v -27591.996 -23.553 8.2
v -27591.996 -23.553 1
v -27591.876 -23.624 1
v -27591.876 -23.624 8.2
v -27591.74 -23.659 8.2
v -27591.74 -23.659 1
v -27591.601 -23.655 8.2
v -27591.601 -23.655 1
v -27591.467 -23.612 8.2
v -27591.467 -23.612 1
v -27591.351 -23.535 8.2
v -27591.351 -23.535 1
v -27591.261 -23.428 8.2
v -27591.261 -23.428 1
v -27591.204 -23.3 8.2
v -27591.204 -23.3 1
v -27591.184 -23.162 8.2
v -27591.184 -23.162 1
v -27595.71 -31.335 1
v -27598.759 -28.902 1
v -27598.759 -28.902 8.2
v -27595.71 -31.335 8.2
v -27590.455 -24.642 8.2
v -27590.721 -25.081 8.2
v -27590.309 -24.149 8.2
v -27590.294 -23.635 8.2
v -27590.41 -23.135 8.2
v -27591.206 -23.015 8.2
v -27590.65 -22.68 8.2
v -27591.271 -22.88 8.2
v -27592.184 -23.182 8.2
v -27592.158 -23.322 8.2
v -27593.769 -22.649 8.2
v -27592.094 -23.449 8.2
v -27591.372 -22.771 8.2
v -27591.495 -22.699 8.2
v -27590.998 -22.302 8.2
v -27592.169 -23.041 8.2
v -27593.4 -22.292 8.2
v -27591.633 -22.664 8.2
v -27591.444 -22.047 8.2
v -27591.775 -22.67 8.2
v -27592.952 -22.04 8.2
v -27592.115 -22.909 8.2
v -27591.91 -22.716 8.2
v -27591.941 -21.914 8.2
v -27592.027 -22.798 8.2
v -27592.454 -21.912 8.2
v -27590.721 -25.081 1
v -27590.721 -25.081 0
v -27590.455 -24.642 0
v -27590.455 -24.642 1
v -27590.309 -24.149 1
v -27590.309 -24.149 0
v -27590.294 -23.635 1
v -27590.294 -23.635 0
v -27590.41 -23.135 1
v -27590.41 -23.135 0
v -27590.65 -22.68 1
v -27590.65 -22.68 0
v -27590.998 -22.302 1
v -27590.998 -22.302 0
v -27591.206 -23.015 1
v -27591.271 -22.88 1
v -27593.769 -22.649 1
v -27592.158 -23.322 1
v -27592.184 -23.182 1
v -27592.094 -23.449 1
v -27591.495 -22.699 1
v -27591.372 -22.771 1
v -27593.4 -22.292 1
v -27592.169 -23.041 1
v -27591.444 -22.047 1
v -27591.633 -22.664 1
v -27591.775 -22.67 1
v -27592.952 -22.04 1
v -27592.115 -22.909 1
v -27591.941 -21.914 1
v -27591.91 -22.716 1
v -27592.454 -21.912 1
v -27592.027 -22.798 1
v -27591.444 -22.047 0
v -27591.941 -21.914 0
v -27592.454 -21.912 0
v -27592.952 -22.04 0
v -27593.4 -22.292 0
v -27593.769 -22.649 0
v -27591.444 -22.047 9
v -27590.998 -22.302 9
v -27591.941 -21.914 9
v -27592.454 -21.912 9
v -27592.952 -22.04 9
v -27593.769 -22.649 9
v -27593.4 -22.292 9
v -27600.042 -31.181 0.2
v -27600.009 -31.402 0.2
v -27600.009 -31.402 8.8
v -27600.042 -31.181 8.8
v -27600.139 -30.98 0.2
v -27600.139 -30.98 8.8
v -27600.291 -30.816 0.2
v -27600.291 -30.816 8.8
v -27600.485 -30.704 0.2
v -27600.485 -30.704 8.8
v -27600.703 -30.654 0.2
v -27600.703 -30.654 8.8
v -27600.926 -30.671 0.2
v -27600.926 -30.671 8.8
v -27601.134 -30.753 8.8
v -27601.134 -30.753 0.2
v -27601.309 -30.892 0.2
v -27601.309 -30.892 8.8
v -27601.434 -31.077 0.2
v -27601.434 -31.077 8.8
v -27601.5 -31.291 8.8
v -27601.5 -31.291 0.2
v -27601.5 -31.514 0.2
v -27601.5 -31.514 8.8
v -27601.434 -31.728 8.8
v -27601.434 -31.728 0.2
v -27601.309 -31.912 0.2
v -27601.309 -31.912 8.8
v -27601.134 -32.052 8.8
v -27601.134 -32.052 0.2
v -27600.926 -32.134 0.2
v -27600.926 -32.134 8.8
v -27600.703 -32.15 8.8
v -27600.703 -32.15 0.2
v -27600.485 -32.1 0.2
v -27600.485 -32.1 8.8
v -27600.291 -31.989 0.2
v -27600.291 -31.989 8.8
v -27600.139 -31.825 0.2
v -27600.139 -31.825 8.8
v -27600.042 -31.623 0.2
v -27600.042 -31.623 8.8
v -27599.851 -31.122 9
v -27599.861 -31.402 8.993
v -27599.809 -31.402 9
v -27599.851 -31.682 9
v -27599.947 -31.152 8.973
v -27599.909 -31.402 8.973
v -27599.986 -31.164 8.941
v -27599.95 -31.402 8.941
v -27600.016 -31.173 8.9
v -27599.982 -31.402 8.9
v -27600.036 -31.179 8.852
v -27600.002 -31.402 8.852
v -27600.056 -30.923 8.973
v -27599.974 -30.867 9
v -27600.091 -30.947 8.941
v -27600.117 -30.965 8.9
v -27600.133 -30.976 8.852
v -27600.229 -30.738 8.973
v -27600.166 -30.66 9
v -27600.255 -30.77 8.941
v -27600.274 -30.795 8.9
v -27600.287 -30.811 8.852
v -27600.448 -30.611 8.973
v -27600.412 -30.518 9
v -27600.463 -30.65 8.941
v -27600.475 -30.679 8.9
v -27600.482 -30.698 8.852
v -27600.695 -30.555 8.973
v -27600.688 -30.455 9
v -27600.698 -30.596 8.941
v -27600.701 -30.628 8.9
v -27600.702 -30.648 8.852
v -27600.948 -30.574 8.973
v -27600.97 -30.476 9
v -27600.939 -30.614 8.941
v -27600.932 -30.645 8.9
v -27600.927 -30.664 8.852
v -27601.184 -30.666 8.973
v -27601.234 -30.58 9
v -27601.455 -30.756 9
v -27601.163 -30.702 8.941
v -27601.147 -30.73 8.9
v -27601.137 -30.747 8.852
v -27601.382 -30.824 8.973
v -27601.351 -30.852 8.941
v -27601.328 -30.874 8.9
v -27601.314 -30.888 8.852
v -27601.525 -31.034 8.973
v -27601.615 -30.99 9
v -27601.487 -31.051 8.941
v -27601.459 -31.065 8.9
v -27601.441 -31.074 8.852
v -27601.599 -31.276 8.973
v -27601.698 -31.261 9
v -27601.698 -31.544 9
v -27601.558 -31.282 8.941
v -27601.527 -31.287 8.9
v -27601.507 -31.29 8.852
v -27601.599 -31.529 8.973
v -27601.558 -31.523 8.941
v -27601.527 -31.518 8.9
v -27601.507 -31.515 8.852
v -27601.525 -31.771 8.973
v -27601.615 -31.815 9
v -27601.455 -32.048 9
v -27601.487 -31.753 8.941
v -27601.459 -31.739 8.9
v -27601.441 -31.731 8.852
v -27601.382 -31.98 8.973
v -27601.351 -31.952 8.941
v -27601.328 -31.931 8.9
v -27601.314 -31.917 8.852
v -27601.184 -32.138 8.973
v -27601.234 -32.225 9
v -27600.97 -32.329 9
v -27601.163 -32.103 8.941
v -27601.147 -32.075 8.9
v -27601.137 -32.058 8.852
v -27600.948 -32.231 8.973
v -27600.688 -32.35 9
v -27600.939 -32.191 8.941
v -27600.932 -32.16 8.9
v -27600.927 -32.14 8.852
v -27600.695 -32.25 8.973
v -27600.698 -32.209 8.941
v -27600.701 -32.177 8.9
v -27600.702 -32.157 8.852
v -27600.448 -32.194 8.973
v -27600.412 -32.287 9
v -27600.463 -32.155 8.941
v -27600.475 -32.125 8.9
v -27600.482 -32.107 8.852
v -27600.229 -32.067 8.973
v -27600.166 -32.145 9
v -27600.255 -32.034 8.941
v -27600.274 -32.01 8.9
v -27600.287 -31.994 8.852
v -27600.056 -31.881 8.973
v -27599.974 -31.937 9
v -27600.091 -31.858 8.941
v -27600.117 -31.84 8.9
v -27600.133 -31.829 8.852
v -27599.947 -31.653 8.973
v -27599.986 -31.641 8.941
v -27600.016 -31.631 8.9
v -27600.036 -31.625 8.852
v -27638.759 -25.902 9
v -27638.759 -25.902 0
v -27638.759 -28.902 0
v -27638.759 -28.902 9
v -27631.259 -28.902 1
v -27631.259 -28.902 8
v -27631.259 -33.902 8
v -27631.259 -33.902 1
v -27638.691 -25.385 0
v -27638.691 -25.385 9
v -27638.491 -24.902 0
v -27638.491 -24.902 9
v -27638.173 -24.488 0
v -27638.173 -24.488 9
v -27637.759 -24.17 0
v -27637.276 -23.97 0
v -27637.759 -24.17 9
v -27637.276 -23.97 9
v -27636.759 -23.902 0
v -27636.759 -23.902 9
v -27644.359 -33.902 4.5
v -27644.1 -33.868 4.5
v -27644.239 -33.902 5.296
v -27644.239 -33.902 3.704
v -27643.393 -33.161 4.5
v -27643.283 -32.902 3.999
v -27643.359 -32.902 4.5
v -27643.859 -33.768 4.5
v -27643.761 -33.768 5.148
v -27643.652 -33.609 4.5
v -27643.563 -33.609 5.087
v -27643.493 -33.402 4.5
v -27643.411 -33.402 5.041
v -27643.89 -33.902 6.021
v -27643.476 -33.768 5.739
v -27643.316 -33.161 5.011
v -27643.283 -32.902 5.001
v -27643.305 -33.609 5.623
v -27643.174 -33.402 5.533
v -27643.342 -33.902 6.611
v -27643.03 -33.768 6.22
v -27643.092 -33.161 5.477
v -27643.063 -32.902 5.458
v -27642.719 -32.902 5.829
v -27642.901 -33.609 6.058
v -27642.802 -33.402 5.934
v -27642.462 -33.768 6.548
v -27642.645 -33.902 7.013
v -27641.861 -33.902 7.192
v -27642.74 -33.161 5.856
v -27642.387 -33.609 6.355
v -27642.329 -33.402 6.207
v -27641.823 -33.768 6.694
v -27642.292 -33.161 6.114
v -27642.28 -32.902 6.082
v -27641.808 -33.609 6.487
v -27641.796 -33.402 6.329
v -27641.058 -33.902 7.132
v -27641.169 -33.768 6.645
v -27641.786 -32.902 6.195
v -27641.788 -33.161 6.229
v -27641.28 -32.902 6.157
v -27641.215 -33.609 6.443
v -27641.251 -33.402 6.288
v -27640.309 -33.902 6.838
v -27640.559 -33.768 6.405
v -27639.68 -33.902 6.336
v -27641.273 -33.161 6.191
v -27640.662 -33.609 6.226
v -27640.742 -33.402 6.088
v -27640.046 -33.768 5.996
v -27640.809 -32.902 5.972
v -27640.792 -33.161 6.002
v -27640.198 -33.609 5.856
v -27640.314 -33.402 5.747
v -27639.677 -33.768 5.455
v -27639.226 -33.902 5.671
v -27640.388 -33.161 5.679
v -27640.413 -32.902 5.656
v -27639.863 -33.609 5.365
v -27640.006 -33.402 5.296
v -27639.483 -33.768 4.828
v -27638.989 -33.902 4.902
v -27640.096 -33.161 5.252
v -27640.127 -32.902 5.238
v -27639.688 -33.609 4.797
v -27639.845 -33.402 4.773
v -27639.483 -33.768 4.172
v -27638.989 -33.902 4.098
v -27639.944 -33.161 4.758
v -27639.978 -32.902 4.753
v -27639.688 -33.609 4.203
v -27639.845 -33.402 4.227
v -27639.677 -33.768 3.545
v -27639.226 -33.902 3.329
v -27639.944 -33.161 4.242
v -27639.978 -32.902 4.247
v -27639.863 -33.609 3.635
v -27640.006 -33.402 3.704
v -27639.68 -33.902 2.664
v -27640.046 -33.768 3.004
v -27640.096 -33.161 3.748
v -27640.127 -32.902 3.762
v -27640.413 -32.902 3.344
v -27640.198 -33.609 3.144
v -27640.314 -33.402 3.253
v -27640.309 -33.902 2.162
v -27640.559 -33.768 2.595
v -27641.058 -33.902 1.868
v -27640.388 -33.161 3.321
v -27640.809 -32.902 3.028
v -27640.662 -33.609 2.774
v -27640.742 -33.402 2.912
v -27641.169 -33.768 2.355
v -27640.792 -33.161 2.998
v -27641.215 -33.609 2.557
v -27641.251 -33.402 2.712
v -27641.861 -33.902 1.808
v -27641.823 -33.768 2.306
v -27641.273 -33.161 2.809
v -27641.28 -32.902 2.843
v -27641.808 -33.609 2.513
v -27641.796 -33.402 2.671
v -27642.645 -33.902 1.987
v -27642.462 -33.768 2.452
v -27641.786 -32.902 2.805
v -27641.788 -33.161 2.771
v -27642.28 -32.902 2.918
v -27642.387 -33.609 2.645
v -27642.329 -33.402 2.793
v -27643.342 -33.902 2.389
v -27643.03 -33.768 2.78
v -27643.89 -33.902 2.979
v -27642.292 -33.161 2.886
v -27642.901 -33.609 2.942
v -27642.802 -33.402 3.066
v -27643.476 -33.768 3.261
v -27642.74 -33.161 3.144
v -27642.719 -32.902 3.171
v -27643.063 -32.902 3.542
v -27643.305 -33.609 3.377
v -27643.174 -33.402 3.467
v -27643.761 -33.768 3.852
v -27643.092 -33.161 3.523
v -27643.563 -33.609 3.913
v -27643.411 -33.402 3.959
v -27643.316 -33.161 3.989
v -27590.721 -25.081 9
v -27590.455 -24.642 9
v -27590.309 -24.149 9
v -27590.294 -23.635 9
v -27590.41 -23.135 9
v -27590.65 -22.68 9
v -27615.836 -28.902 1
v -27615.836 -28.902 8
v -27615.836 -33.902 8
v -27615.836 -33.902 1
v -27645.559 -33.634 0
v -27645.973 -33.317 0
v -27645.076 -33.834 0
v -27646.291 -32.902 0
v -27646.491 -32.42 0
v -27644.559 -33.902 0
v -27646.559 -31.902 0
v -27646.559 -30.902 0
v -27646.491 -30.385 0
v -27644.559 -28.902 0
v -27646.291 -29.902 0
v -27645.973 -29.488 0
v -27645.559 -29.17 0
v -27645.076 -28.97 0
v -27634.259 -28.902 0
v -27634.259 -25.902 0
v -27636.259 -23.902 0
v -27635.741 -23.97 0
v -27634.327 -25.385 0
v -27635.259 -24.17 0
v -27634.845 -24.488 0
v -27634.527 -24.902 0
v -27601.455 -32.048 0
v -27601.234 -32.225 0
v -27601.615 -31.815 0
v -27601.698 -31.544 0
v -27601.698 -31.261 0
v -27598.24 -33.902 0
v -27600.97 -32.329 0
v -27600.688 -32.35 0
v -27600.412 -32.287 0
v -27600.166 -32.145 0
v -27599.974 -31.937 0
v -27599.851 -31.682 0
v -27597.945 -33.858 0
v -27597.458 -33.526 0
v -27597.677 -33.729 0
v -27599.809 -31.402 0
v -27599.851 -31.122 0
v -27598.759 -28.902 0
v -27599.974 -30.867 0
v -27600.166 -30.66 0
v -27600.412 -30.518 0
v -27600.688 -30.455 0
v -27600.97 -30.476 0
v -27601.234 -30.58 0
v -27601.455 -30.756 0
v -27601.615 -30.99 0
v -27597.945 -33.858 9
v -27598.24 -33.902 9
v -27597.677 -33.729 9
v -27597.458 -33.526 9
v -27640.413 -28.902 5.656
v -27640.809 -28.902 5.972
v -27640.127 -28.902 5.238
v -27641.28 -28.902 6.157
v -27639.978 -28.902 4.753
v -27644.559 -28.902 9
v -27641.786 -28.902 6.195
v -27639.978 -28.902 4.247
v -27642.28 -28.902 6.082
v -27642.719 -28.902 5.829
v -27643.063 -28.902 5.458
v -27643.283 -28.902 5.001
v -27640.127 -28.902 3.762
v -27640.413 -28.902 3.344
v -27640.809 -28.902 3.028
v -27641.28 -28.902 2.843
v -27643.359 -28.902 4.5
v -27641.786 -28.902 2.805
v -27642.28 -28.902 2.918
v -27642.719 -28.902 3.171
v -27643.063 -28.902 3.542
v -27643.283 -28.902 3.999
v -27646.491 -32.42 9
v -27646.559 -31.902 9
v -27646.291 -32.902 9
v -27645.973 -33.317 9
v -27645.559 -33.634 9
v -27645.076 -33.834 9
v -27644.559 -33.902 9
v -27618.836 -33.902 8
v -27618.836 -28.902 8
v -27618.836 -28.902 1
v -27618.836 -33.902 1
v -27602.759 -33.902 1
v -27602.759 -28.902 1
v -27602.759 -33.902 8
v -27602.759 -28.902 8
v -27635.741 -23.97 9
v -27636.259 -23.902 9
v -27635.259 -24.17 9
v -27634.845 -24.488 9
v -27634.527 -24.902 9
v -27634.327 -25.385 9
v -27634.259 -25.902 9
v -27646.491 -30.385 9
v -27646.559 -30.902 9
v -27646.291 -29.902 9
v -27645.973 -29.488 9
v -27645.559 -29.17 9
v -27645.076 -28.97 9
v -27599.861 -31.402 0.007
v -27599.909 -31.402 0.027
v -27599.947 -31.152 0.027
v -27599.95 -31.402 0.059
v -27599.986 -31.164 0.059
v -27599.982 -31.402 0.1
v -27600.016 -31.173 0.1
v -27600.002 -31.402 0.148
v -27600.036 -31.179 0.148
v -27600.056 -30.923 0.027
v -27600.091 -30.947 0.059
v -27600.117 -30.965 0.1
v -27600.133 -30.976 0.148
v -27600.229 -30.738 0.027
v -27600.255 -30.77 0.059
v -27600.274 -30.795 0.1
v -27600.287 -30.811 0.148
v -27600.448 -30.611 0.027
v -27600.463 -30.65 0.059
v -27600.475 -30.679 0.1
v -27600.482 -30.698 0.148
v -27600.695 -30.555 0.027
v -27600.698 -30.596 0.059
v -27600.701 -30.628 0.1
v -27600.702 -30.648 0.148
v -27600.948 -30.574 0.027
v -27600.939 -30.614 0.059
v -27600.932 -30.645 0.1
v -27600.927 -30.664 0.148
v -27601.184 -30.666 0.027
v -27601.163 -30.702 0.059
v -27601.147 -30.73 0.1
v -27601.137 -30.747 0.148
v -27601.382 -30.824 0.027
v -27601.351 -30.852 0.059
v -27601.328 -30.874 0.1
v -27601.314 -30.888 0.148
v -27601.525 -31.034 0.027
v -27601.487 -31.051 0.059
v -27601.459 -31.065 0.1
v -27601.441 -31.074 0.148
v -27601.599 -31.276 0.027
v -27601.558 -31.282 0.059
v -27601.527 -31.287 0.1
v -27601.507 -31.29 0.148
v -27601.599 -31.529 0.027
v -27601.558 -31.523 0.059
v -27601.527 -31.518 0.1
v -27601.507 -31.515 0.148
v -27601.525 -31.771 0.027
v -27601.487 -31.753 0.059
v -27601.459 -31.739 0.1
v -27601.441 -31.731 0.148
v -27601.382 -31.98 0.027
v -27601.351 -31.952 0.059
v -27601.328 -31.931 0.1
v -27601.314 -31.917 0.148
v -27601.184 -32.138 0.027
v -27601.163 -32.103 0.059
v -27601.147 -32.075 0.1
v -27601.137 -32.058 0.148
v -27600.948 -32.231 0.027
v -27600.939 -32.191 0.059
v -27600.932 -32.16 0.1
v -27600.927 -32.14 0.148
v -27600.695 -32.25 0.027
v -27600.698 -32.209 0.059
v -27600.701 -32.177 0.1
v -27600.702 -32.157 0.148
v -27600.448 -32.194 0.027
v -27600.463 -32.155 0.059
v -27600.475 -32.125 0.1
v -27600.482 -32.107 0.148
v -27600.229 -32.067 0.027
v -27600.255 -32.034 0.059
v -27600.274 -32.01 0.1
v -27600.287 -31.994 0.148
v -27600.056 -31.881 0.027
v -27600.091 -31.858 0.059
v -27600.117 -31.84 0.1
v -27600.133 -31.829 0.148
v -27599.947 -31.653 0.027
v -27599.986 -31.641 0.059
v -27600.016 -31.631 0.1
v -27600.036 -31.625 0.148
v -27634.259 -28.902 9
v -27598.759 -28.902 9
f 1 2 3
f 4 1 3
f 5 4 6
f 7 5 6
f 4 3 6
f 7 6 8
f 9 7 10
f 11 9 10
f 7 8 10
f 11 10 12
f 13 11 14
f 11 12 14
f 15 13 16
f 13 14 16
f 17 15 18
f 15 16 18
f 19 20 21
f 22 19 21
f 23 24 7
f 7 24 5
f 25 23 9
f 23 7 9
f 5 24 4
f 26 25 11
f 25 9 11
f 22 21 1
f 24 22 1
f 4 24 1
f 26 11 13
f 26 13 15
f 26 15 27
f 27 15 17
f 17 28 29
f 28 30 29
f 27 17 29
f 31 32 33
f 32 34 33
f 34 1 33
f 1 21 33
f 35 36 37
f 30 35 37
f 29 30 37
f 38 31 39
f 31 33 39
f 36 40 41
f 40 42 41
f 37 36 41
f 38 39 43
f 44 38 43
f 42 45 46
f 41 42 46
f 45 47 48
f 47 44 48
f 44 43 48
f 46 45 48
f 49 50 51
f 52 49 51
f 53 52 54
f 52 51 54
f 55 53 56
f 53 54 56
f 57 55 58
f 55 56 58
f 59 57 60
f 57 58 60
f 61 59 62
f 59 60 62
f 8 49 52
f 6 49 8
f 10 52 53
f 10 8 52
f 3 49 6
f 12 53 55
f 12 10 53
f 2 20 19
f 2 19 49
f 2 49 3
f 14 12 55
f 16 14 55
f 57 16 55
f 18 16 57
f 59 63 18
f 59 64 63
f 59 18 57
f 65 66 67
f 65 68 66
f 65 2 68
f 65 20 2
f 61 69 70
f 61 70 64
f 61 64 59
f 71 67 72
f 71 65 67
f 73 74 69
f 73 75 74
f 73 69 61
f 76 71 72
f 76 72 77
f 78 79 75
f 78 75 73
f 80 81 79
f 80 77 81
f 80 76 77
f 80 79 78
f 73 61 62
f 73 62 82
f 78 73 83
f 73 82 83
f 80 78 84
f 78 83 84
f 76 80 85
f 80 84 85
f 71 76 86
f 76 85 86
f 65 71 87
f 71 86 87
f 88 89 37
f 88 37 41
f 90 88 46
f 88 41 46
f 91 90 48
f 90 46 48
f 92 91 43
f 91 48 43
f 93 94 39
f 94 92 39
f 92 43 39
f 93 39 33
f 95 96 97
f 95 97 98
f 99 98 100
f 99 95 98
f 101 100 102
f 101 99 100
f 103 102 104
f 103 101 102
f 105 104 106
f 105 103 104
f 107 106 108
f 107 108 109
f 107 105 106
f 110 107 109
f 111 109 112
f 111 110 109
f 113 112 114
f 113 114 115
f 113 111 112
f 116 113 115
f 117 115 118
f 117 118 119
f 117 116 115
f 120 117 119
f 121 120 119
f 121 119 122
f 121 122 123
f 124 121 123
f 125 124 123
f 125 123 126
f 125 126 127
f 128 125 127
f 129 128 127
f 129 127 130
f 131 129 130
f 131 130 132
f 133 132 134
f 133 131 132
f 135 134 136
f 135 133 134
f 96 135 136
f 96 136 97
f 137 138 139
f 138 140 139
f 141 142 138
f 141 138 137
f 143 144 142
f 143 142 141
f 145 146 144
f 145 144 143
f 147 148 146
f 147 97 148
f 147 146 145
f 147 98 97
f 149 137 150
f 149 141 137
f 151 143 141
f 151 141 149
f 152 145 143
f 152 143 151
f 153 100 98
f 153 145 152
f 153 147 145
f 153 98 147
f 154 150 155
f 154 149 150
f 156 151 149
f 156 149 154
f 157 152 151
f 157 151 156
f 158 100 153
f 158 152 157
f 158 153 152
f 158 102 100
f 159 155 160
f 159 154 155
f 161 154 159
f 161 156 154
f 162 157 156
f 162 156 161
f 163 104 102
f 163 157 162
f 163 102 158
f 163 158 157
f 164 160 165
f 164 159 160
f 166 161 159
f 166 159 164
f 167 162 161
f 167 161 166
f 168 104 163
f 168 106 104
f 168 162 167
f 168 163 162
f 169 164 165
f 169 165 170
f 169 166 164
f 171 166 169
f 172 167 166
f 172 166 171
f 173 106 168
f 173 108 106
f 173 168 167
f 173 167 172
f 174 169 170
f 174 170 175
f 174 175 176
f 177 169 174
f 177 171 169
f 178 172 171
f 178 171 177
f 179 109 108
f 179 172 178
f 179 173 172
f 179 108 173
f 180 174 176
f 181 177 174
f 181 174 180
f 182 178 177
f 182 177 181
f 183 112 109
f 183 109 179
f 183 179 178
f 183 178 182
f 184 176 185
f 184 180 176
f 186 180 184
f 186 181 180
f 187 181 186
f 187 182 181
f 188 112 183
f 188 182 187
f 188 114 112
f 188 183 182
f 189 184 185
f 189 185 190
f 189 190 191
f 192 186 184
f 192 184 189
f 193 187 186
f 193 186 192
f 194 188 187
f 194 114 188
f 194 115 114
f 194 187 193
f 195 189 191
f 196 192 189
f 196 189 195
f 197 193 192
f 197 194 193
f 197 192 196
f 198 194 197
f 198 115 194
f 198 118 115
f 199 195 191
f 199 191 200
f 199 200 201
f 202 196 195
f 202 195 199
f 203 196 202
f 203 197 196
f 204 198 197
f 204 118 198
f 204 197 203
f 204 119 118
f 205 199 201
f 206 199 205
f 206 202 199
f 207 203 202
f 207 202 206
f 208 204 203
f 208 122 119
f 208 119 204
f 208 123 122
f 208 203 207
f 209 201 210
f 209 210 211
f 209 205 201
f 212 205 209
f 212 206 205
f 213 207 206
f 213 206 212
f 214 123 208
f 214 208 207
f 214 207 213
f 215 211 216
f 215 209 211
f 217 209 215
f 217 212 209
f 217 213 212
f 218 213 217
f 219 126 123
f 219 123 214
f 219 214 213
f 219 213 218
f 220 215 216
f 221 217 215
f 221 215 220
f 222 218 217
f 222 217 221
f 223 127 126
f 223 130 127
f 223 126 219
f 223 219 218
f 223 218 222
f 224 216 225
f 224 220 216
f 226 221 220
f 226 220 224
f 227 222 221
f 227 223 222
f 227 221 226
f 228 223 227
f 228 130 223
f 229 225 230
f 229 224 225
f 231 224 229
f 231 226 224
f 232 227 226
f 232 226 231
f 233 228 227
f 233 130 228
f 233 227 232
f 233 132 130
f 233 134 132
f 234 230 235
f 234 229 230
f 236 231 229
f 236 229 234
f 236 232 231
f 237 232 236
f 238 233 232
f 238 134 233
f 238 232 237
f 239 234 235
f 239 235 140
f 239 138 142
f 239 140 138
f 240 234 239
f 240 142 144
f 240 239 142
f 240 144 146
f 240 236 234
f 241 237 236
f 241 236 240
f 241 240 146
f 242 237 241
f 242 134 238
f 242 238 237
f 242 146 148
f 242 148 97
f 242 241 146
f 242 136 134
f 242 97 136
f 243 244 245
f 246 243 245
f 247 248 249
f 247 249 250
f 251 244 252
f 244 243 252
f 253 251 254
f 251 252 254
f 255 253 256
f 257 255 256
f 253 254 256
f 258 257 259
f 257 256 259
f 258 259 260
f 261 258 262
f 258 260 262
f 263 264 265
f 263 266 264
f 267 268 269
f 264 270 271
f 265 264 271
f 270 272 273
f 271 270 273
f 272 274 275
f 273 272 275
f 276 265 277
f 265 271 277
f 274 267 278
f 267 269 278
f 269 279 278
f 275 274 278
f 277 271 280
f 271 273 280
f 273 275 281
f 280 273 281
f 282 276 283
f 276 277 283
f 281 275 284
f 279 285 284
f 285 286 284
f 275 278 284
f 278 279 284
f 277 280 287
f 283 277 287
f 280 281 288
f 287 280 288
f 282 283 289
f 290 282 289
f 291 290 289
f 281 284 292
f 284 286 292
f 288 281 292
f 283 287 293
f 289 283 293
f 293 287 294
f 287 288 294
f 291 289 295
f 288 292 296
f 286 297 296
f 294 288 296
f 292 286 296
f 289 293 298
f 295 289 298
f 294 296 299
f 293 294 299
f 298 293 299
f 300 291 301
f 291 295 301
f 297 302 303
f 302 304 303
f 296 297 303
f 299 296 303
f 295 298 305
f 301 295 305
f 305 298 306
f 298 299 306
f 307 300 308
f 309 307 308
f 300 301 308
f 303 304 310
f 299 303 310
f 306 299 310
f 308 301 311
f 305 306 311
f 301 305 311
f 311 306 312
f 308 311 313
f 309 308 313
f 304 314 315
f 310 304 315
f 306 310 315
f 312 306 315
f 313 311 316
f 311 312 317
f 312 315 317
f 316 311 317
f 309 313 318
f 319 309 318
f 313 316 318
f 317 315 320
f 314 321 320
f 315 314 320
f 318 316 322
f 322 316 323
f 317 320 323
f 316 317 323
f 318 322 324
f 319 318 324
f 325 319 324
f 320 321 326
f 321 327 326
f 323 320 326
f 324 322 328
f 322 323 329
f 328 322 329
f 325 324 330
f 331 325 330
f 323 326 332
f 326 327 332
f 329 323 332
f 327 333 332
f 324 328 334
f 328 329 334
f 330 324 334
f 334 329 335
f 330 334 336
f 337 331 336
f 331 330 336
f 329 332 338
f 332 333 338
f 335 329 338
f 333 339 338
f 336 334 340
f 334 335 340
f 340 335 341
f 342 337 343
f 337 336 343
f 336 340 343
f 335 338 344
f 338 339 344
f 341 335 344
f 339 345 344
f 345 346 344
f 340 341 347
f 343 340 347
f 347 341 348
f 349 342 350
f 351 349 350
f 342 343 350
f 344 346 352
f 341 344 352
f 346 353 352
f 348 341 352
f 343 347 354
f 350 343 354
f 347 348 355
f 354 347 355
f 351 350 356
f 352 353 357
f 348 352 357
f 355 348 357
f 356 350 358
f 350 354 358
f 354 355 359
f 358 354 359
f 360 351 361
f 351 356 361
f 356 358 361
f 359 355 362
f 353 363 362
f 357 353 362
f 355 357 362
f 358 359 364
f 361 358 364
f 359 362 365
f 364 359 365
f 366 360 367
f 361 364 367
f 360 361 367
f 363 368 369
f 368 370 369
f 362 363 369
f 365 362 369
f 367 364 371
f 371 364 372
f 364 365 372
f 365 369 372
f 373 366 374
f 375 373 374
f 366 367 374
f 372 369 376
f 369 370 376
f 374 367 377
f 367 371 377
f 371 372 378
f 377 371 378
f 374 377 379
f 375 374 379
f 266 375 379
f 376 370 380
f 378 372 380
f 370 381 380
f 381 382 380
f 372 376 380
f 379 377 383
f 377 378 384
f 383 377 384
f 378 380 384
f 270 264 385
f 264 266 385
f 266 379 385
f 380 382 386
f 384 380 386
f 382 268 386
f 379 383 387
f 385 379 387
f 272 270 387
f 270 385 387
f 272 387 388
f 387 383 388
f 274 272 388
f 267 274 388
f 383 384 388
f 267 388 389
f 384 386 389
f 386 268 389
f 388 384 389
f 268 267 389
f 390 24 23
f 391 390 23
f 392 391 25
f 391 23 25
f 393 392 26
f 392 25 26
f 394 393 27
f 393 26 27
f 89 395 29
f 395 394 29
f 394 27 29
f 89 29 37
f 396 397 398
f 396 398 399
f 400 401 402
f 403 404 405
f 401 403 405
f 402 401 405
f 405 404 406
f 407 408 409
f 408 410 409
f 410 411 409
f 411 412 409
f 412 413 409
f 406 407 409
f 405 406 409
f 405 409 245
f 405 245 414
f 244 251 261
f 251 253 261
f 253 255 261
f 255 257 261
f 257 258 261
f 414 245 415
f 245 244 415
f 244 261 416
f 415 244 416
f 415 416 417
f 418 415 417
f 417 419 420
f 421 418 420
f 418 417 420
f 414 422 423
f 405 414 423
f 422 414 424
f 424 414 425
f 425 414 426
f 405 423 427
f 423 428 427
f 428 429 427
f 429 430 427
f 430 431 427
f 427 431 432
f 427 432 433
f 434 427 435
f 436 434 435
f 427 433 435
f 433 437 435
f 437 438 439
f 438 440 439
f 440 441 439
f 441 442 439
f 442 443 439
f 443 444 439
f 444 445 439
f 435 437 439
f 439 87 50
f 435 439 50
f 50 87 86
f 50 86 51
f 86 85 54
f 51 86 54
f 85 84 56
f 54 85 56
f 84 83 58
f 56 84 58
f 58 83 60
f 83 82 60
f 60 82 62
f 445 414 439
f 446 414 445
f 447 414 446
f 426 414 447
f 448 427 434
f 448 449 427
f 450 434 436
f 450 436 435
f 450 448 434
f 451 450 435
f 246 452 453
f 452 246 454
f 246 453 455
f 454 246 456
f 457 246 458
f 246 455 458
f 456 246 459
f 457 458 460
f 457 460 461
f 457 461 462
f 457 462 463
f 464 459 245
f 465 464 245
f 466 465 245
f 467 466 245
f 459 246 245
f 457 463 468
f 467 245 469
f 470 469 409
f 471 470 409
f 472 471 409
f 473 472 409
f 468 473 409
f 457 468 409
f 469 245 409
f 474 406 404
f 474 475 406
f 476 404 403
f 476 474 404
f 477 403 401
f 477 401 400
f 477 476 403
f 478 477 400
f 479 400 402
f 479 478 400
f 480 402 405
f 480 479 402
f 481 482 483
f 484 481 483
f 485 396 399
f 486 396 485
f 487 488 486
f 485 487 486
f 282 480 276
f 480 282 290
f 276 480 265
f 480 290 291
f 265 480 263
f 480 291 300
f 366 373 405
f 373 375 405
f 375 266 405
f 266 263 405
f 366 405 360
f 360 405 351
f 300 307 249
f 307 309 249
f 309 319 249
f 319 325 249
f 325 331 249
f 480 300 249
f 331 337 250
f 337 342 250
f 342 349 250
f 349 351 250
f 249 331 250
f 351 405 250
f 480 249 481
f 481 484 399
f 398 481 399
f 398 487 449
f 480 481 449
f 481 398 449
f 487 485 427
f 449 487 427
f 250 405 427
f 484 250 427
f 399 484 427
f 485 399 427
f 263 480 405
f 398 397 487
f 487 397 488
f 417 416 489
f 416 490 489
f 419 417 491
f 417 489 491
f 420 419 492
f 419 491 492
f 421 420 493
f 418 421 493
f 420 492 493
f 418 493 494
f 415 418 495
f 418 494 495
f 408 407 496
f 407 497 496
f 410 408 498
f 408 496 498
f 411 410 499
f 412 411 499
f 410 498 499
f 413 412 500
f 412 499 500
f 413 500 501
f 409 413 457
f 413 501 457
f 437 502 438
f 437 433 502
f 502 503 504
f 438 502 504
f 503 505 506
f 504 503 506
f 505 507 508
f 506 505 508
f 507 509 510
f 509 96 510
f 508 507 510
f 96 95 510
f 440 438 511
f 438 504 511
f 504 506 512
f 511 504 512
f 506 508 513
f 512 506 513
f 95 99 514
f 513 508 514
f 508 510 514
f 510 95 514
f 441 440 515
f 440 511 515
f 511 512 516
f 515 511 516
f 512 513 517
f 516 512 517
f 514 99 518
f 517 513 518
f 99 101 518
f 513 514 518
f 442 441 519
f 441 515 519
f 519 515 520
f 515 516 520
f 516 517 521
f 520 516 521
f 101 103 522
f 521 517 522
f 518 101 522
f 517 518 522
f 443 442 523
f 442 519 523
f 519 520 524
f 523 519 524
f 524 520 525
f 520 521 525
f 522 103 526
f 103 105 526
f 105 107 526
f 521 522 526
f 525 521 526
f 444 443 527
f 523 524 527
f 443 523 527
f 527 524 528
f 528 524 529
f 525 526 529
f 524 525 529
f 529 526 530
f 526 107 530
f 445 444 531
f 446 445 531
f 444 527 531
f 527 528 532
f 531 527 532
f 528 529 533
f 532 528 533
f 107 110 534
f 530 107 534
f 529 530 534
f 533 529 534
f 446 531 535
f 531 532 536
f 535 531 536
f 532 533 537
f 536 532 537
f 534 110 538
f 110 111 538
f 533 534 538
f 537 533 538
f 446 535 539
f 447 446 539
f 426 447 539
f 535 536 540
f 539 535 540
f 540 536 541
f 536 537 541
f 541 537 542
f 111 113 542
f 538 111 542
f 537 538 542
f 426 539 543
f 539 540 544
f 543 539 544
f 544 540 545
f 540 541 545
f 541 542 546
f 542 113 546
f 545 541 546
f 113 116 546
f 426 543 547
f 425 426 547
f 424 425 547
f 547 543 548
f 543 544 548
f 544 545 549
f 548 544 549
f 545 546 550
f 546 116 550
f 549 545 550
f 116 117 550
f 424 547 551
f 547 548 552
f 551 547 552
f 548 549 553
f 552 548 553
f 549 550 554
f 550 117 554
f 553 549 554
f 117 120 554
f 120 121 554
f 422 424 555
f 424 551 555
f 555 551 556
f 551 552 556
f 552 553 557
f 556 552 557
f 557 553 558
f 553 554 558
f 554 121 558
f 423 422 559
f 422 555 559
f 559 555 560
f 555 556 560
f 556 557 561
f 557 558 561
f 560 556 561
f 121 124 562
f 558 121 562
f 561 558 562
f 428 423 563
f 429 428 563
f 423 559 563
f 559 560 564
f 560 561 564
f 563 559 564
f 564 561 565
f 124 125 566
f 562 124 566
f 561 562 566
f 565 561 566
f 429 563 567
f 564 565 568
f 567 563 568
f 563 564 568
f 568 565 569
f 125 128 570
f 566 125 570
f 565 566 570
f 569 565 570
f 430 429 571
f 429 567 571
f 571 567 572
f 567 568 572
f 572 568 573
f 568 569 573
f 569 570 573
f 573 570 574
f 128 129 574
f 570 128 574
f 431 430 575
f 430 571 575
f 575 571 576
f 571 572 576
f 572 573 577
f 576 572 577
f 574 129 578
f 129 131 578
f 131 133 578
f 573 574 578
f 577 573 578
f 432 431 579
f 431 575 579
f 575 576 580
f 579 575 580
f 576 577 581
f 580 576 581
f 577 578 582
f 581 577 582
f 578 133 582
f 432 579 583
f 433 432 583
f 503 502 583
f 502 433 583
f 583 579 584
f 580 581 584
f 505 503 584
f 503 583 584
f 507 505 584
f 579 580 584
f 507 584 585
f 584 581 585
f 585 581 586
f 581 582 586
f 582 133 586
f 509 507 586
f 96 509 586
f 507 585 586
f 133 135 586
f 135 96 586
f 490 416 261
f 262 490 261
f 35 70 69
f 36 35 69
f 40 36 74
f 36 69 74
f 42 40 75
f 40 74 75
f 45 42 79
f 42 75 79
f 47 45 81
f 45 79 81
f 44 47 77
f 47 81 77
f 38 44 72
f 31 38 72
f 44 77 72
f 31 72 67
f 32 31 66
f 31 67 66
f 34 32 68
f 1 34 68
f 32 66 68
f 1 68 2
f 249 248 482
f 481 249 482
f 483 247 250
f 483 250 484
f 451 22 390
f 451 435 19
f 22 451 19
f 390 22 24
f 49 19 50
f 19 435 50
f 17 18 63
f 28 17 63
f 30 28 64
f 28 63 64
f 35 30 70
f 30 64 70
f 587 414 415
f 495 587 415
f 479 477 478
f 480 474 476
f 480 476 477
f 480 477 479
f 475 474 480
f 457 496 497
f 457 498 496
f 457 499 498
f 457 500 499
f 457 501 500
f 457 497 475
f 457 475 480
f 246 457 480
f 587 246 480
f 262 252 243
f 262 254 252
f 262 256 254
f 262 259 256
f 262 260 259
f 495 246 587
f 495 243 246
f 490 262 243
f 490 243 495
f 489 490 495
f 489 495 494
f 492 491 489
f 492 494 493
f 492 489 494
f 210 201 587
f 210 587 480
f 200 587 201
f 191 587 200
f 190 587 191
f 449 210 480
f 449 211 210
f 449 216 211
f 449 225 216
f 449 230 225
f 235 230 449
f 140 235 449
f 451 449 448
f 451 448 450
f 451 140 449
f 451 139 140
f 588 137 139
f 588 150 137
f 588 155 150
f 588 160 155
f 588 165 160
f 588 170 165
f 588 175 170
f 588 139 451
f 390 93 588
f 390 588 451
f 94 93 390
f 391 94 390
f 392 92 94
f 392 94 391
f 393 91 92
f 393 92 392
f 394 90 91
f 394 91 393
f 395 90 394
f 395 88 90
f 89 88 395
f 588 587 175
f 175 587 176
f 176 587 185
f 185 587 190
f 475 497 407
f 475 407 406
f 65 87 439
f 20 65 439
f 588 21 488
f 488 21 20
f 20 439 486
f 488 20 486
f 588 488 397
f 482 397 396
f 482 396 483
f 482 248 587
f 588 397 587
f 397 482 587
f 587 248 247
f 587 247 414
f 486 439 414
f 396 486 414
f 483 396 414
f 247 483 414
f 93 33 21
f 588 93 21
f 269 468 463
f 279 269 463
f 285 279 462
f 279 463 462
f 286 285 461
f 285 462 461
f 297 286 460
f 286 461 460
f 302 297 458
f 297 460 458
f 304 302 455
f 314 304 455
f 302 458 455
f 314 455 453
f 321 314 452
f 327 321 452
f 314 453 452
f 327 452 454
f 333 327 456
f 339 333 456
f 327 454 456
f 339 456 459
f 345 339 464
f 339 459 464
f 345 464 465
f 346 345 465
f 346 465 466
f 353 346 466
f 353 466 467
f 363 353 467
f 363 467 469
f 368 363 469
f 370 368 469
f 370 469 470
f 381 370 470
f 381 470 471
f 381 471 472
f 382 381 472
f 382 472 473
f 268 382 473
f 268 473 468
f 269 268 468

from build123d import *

# Parameters (mm, degrees)
SZKIC1_R                    = 0.75
DODANIE_WYCI_GNI_CIE1_DEPTH = 9
ZAOKR_GLENIE1_R             = 2
ZAOKR_GLENIE3_R             = 1
SZKIC2_R                    = 1.7
WYTNIJ_WYCI_GNI_CIE1_DEPTH  = 27647.561311418
SZKIC3_W                    = 13.077407628
SZKIC3_H                    = 7
SZKIC3_W_2                  = 12.422592372
WYTNIJ_WYCI_GNI_CIE2_DEPTH  = 27647.561311418
SZKIC4_W                    = 7.2
SZKIC4_H                    = 12.770373744
WYTNIJ_WYCI_GNI_CIE3_DEPTH  = 17269.61853488
ZAOKR_GLENIE4_R             = 2
ZAOKR_GLENIE5_R             = 1
ZAOKR_GLENIE7_R             = 0.2
DODANIE_WYCI_GNI_CIE3_DEPTH = 7.2


with BuildPart() as part:
    # Szkic1 → Dodanie-wyciągnięcie1 (new body)
    with BuildSketch(Plane.XY):
        Polygon((-27646.558741393, -28.902320952), (-27646.558741393, -33.902320952), (-27597.758741393, -33.902320952), (-27589.47352106, -23.517649804), (-27592.522131216, -21.085371835), (-27598.758741393, -28.902320952), (-27634.258741393, -28.902320952), (-27634.258741393, -23.902320952), (-27638.758741393, -23.902320952), (-27638.758741393, -28.902320952), align=None)
        with Locations((-27600.758741393, -31.402320952)):
            Circle(SZKIC1_R, mode=Mode.SUBTRACT)
    extrude(amount=DODANIE_WYCI_GNI_CIE1_DEPTH)

    # Zaokrąglenie1
    zaokr_glenie1_edges = [part.edges().sort_by_distance(p)[0] for p in [
        (-27638.758741393, -23.902320952, 4.5),
        (-27634.258741393, -23.902320952, 4.5),
        (-27646.558741393, -33.902320952, 4.5),
        (-27646.558741393, -28.902320952, 4.5),
    ]]
    fillet(zaokr_glenie1_edges, radius=ZAOKR_GLENIE1_R)

    # Zaokrąglenie3
    zaokr_glenie3_edges = [part.edges().sort_by_distance(p)[0] for p in [
        (-27597.758741393, -33.902320952, 4.5),
    ]]
    fillet(zaokr_glenie3_edges, radius=ZAOKR_GLENIE3_R)

    # Szkic2 → Wytnij-wyciągnięcie1 (cut, through all)
    with BuildSketch(Plane(origin=(0, -28.902320952, 0), x_dir=(1, 0, 0), z_dir=(0, 1, 0))):
        with Locations(Location((-27641.658741393, -4.5, 0), (0, 0, 180))):
            Circle(SZKIC2_R)
    extrude(amount=-WYTNIJ_WYCI_GNI_CIE1_DEPTH, mode=Mode.SUBTRACT)

    # Szkic3 → Wytnij-wyciągnięcie2 (cut, through all)
    with BuildSketch(Plane(origin=(0, -28.902320952, 0), x_dir=(1, 0, 0), z_dir=(0, 1, 0))):
        with Locations((-27609.297445207, -4.5)):
            Rectangle(SZKIC3_W, SZKIC3_H)
        with Locations((-27625.047445207, -4.5)):
            Rectangle(SZKIC3_W_2, SZKIC3_H)
    extrude(amount=-WYTNIJ_WYCI_GNI_CIE2_DEPTH, mode=Mode.SUBTRACT)

    # Szkic4 → Wytnij-wyciągnięcie3 (cut, through all)
    with BuildSketch(Plane(origin=(-16850.04669364, 13443.502203136, 0), x_dir=(0, 0, 1), z_dir=(-0.7816949117558672, 0.6236610176490005, 0))):
        with Locations((4.6, -17228.477572842)):
            Rectangle(SZKIC4_W, SZKIC4_H)
    extrude(amount=-WYTNIJ_WYCI_GNI_CIE3_DEPTH, mode=Mode.SUBTRACT)

    # Zaokrąglenie4
    # the kernel refuses this fillet: 2 mm, written as the material it takes off along each edge
    with BuildSketch(Plane(origin=(-27589.47352106, -23.517649804, -5), x_dir=(-0.6236610176488676, -0.7816949117559733, 0), z_dir=(0, 0, 1)), Plane(origin=(-27592.522131216, -21.085371835, -5), x_dir=(0.78169491175572, -0.623661017649185, 0), z_dir=(0, 0, 1))) as zaokr_glenie4_piece_1:
        with BuildLine():
            CenterArc((ZAOKR_GLENIE4_R, -ZAOKR_GLENIE4_R), ZAOKR_GLENIE4_R, 90, 90)
            Line((0, -ZAOKR_GLENIE4_R), (0, 0))
            Line((0, 0), (ZAOKR_GLENIE4_R, 0))
        make_face()
    extrude(amount=11, mode=Mode.SUBTRACT)
    with BuildSketch(Plane(origin=(-27589.47352106, -23.517649804, 3.2), x_dir=(-0.6236610176488676, -0.7816949117559733, 0), z_dir=(0, 0, 1)), Plane(origin=(-27592.522131216, -21.085371835, 3.2), x_dir=(0.78169491175572, -0.623661017649185, 0), z_dir=(0, 0, 1))) as zaokr_glenie4_piece_2:
        with BuildLine():
            CenterArc((ZAOKR_GLENIE4_R, -ZAOKR_GLENIE4_R), ZAOKR_GLENIE4_R, 90, 90)
            Line((0, -ZAOKR_GLENIE4_R), (0, 0))
            Line((0, 0), (ZAOKR_GLENIE4_R, 0))
        make_face()
    extrude(amount=10.8, mode=Mode.SUBTRACT)

    # Zaokrąglenie5
    zaokr_glenie5_edges = [part.edges().sort_by_distance(p)[0] for p in [
        (-27639.958741393, -33.902320952, 4.5),
    ]]
    fillet(zaokr_glenie5_edges, radius=ZAOKR_GLENIE5_R)

    # Zaokrąglenie7
    zaokr_glenie7_edges = [part.edges().sort_by_distance(p)[0] for p in [
        (-27601.508741393, -31.402320952, 0),
        (-27601.508741393, -31.402320952, 9),
    ]]
    fillet(zaokr_glenie7_edges, radius=ZAOKR_GLENIE7_R)

    # Szkic6 → Dodanie-wyciągnięcie3 (add)
    with BuildSketch(Plane.XY.offset(1)):
        with BuildLine():
            ThreePointArc((-27591.372412611, -22.771016391), (-27592.075090576, -22.850033338), (-27591.996073629, -23.552711303))
            Line((-27591.996073629, -23.552711303), (-27591.372412611, -22.771016391))
        make_face()
        with BuildLine():
            Line((-27591.372412611, -22.771016391), (-27591.996073629, -23.552711303))
            ThreePointArc((-27591.996073629, -23.552711303), (-27591.467350583, -23.612372035), (-27591.18424312, -23.161863847))
            ThreePointArc((-27591.18424312, -23.161863847), (-27591.233734932, -22.944971309), (-27591.372412611, -22.771016391))
        make_face()
    extrude(amount=DODANIE_WYCI_GNI_CIE3_DEPTH)


solid = part.part
